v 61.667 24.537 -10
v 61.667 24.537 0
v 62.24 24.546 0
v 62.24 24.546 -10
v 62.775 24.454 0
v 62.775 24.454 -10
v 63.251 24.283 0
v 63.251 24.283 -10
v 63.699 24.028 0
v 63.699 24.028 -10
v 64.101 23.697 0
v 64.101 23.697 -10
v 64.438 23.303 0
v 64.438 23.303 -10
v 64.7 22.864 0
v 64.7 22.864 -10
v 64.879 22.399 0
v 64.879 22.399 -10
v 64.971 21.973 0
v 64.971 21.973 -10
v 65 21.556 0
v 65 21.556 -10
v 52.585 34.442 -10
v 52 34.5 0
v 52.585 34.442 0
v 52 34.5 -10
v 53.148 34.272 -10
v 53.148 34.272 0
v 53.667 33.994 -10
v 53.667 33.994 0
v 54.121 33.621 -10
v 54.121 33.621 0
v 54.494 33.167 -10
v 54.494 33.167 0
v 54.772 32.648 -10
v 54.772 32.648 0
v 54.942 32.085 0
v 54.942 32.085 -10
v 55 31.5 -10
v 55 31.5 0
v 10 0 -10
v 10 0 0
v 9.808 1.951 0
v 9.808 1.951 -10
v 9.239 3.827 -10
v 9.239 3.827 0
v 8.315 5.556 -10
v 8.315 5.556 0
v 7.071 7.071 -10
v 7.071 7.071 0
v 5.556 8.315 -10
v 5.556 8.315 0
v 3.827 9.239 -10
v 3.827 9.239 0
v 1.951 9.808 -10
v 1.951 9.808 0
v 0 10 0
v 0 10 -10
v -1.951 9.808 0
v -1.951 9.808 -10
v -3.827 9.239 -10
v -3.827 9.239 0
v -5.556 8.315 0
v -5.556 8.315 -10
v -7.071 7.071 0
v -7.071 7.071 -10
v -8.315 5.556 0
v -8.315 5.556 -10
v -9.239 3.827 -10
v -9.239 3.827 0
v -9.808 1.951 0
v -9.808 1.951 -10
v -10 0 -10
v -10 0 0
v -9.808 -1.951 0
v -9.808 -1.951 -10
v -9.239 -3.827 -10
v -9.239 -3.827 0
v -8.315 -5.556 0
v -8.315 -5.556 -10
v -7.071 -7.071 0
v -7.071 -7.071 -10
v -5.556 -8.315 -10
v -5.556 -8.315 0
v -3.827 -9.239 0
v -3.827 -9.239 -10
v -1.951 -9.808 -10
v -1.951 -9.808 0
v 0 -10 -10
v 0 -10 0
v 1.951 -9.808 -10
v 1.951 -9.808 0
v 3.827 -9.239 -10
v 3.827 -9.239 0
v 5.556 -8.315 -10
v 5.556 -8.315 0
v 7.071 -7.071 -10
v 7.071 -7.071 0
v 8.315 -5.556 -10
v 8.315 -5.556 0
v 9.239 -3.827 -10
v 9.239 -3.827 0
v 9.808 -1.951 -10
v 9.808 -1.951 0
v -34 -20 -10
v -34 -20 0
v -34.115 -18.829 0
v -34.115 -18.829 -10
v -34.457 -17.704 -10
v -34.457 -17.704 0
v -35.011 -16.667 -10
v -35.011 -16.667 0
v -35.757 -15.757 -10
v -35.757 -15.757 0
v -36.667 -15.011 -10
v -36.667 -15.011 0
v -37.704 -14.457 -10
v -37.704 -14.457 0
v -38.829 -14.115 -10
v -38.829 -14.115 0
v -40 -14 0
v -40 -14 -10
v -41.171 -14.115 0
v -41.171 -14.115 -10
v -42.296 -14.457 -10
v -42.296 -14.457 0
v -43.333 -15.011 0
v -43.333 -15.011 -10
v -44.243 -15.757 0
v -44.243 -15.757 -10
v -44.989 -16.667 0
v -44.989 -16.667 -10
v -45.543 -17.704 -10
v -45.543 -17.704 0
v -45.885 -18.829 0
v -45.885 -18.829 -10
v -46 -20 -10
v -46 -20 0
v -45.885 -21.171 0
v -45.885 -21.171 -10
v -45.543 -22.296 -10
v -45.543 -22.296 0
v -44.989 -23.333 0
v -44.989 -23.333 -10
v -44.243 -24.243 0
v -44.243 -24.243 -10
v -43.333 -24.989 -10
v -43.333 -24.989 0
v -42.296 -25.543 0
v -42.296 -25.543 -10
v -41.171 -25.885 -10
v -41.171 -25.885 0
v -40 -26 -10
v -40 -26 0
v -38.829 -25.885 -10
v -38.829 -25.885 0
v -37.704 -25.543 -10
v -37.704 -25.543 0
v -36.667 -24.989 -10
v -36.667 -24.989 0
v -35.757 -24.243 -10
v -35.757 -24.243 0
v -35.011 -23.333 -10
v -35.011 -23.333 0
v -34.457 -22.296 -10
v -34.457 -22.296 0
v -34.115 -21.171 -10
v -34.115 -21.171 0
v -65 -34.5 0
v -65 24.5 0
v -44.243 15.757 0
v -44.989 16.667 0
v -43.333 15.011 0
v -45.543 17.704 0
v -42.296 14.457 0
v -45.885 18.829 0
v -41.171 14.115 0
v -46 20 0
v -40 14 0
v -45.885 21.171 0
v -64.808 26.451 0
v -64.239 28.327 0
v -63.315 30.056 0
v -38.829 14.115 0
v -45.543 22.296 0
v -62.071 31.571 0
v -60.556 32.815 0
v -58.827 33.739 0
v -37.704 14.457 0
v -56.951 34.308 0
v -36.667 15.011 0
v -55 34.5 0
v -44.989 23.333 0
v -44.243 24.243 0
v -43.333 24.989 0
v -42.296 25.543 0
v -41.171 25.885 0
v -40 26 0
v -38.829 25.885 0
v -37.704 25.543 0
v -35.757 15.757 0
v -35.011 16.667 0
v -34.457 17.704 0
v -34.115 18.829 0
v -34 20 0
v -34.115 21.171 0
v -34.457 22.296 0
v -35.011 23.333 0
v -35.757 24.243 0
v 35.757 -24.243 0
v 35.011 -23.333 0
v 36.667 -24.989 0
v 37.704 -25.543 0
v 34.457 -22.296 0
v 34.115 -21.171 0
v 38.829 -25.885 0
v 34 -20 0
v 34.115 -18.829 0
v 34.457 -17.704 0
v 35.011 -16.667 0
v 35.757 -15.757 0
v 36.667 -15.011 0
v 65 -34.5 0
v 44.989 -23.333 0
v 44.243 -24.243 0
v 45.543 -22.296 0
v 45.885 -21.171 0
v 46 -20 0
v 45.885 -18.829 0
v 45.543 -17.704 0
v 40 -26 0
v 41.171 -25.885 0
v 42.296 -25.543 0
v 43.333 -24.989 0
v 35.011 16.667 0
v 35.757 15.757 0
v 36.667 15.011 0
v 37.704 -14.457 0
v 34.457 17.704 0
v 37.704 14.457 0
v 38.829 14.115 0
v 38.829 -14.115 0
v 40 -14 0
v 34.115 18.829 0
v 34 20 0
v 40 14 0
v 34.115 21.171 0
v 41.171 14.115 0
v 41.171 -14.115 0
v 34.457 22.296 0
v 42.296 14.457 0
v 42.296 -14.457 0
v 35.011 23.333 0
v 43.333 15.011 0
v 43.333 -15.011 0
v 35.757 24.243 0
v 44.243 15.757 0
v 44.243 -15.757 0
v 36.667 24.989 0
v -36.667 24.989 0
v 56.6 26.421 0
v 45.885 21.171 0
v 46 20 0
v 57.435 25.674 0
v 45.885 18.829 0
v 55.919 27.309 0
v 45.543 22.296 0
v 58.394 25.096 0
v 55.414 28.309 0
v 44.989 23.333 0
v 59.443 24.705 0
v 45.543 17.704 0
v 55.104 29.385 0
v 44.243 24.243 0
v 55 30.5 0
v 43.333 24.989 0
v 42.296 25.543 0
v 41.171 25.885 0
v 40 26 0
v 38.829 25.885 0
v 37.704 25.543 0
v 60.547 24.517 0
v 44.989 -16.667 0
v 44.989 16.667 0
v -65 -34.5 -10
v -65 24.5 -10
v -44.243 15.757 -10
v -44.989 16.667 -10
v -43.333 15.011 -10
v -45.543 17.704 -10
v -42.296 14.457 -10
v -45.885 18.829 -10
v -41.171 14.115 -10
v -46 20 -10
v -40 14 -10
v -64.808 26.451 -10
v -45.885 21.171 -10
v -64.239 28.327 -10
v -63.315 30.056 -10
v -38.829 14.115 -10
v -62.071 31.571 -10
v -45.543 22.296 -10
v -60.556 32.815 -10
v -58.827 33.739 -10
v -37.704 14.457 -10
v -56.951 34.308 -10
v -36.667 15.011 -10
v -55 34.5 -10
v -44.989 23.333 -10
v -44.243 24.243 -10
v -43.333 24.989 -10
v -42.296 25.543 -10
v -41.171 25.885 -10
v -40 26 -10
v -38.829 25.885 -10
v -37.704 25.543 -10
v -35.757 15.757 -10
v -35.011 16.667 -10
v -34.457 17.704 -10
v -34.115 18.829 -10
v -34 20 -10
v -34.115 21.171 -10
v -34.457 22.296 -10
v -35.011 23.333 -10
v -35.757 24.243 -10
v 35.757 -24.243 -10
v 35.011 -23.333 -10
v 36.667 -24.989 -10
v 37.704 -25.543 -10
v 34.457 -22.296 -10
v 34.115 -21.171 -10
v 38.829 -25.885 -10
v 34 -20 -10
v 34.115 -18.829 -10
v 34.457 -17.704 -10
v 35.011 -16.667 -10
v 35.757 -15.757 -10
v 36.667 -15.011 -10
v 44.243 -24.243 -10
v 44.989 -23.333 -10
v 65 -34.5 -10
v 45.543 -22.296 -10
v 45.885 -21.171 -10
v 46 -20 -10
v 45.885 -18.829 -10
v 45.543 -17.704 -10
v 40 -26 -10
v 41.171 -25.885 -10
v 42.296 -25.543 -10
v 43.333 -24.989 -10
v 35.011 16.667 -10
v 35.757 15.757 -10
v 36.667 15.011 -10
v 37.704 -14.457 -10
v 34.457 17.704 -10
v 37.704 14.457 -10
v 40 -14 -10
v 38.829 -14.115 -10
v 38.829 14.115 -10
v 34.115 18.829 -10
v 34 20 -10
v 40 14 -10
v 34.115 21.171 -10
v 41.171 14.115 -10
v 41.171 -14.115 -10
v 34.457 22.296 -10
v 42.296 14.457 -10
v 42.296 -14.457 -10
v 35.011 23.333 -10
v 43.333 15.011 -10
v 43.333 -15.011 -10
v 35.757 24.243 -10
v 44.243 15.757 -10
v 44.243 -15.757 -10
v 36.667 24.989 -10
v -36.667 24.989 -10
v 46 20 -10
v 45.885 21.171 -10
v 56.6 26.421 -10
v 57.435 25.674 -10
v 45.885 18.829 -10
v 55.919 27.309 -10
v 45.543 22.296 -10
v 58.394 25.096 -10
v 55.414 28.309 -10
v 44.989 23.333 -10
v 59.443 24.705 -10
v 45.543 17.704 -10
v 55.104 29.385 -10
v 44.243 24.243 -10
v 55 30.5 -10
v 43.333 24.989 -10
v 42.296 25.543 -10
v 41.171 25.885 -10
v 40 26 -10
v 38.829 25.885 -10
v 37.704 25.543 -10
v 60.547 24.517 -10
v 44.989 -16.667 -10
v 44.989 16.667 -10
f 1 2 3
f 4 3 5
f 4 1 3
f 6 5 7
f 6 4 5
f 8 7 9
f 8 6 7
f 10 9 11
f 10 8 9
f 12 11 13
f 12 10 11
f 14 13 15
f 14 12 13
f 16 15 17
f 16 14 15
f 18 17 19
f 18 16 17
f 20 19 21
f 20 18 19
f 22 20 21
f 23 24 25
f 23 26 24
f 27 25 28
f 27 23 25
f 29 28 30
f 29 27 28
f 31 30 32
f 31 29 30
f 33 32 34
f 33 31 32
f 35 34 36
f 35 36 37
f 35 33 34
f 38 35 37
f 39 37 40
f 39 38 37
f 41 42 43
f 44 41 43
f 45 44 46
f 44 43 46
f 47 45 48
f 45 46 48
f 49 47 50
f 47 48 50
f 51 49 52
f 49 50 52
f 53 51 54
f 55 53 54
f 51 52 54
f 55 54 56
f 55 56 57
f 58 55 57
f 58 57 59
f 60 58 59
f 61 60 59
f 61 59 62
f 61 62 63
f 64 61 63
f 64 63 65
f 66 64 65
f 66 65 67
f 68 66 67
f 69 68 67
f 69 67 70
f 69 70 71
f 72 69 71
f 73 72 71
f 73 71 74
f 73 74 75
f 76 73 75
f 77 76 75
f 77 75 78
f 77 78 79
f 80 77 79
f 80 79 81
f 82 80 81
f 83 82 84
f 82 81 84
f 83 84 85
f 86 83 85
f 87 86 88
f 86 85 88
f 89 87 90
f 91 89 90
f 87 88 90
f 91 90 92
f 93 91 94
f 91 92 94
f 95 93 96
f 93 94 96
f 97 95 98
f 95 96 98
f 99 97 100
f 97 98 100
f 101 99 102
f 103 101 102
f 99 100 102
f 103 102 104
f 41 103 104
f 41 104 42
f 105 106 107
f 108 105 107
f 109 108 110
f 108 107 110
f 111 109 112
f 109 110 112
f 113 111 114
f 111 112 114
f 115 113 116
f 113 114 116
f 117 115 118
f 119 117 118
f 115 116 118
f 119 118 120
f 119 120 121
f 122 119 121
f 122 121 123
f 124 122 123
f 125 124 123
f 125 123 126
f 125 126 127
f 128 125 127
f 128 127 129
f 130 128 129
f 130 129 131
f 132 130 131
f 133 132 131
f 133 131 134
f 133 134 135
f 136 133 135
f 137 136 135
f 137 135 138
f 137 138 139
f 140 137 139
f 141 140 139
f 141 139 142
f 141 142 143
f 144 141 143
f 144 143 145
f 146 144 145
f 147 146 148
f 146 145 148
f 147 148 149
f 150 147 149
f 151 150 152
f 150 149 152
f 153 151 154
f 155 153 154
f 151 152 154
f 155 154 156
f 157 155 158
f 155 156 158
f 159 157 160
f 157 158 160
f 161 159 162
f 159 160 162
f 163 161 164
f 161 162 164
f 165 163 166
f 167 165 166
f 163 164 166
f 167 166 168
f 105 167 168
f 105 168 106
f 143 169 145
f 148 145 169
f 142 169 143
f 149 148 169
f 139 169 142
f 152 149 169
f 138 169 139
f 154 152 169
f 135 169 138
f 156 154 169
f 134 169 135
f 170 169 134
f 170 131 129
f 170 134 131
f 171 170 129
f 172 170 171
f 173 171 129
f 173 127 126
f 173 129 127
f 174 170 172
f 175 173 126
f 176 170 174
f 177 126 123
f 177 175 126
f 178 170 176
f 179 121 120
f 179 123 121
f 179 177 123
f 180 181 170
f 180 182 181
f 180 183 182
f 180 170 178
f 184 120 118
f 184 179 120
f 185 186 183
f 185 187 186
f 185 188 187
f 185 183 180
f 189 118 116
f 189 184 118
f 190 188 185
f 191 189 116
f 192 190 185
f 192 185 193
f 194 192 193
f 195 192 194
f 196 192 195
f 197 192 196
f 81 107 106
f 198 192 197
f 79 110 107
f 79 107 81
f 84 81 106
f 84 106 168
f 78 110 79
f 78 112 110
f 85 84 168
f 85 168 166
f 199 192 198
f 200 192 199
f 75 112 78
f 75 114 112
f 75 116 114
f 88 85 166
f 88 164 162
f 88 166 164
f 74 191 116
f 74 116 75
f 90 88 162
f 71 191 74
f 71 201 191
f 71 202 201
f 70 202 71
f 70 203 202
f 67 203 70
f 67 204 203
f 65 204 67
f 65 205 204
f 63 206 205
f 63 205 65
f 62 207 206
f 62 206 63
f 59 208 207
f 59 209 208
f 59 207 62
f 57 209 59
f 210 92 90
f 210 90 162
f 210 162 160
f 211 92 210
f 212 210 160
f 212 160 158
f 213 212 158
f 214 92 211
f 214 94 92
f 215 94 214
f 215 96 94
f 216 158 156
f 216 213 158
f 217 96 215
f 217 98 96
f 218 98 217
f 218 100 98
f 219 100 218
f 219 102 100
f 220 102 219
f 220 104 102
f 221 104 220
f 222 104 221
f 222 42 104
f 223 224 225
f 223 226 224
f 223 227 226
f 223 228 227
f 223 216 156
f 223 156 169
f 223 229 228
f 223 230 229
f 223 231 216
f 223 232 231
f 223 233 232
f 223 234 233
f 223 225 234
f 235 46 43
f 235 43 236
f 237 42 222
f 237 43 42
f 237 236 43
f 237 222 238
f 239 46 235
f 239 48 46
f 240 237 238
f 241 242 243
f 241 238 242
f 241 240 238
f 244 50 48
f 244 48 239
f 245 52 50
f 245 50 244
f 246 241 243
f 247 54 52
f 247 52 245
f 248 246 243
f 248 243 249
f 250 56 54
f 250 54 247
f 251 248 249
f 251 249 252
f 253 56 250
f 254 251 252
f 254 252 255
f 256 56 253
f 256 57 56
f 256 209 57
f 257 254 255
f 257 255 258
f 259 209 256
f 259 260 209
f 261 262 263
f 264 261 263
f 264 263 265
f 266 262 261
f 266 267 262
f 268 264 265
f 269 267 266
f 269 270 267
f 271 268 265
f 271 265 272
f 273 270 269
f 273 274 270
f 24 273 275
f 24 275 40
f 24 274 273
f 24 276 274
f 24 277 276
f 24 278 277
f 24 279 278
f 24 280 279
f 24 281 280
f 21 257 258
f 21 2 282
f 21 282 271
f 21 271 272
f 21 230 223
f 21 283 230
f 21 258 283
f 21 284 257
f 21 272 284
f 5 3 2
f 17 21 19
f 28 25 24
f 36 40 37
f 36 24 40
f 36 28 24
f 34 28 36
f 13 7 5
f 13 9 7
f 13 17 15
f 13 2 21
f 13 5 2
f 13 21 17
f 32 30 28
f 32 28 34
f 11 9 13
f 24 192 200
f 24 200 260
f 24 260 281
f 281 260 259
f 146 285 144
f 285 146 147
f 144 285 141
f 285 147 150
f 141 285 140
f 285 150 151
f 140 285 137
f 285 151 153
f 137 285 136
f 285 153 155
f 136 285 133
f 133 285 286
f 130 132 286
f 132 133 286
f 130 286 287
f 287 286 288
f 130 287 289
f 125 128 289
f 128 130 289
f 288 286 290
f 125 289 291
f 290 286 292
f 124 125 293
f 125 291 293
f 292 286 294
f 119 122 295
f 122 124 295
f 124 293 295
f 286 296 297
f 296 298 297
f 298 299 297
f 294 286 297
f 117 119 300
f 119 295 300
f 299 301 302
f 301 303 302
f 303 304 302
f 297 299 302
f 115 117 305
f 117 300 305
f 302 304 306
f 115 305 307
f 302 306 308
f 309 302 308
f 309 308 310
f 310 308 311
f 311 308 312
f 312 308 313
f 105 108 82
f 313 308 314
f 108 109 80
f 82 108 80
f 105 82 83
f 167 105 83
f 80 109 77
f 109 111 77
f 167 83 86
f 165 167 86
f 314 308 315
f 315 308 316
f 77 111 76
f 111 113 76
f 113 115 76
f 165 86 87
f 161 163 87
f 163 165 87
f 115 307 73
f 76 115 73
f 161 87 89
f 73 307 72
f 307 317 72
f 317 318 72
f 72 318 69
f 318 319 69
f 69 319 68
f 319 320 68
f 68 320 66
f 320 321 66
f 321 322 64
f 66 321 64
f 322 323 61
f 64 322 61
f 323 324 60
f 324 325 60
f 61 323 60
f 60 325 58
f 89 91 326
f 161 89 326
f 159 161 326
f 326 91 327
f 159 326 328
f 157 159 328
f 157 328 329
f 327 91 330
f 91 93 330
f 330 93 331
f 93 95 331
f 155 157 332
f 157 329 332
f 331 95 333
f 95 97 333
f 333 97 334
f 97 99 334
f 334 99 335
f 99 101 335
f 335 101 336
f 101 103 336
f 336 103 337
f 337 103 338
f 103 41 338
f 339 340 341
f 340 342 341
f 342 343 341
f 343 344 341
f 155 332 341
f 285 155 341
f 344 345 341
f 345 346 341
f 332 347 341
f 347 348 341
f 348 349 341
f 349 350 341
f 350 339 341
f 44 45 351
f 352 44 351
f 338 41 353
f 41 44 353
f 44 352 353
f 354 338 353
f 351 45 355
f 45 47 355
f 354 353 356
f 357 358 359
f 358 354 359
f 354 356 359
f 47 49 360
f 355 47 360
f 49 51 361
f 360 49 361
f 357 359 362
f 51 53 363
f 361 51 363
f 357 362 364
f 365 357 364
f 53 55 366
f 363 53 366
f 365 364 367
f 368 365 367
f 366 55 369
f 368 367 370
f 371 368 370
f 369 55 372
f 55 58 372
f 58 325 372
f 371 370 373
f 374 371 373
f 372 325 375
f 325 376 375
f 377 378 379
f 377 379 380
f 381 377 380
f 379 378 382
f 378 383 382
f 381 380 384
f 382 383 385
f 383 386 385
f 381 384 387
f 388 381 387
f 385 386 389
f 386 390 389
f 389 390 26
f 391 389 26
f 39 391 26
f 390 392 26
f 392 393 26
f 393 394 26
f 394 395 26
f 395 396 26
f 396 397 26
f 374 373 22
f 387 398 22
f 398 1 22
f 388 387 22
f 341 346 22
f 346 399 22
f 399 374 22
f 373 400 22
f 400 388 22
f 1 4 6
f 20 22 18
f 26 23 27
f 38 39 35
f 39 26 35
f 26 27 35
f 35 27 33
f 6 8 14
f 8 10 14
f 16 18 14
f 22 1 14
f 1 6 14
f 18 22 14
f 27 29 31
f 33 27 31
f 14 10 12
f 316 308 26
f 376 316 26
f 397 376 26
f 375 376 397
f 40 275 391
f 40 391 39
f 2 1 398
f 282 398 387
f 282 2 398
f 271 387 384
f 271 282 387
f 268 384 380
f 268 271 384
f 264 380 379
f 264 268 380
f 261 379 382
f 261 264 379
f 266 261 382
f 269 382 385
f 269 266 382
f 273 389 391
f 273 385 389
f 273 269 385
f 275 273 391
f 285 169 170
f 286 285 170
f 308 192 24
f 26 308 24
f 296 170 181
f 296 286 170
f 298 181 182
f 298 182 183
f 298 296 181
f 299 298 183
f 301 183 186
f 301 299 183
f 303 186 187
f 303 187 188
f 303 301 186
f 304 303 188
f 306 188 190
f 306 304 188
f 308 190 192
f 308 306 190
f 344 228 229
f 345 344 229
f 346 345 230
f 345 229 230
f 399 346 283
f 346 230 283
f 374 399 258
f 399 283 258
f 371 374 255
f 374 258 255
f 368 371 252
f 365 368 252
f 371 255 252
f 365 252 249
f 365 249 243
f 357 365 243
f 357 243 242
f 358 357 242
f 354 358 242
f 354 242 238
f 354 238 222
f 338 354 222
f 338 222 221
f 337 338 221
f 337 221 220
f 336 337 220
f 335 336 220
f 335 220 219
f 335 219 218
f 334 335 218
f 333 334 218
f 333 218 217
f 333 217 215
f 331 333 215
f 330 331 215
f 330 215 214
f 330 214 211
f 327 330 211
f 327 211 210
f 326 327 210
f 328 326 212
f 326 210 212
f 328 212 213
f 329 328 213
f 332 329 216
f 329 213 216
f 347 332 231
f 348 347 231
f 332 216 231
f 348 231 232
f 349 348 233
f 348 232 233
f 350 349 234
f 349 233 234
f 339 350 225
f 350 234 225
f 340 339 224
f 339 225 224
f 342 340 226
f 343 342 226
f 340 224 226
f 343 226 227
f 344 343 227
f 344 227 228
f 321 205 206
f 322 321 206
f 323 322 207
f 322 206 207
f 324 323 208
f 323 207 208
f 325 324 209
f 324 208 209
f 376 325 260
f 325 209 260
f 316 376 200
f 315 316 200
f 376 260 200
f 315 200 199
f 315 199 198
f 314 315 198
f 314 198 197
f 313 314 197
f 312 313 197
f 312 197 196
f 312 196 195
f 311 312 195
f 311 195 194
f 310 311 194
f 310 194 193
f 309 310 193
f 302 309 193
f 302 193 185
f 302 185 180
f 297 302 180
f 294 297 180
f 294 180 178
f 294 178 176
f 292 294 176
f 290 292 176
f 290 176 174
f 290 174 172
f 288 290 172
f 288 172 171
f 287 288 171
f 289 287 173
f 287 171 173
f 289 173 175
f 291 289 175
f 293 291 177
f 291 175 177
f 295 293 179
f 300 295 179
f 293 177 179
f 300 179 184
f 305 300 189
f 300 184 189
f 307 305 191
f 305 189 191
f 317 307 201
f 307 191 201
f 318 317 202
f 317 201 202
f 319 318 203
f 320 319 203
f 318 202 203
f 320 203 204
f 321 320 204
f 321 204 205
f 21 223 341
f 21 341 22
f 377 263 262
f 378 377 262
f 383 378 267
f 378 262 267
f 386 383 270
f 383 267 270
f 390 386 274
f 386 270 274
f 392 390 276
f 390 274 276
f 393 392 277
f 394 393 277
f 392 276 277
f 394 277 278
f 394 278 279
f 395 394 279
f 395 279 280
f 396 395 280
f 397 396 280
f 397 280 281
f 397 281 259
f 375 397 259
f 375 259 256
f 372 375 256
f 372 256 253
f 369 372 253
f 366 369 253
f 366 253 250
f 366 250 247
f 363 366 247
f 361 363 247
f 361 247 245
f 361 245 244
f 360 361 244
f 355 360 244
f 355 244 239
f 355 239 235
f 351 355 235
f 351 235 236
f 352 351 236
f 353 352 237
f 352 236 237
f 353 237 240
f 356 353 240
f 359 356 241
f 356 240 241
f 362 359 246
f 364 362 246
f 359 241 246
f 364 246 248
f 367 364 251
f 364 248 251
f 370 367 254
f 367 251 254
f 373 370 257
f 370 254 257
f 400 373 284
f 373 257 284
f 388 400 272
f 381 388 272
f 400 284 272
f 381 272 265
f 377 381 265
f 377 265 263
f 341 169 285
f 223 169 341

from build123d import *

# Parameters (mm, degrees)
SKETCH1_W          = 130
SKETCH1_H          = 69
BASE_FLANGE1_DEPTH = 10
SKETCH6_R          = 10
SKETCH6_R_2        = 6
CUT_EXTRUDE1_DEPTH = 75.264729179
FILLET1_R          = 10
CUT_EXTRUDE2_DEPTH = 75.264729179
FILLET2_R          = 3


# Sheet-metal steps are written as plain solids
with BuildPart() as part:
    # Sketch1 → Base-Flange1 (new body)
    with BuildSketch(Plane.XY):
        Rectangle(SKETCH1_W, SKETCH1_H)
    extrude(amount=-BASE_FLANGE1_DEPTH)

    # Sketch6 → Cut-Extrude1 (cut, through all)
    with BuildSketch(Plane.XY):
        Circle(SKETCH6_R)
        with Locations((-40, 20)):
            Circle(SKETCH6_R_2)
        with Locations((-40, -20)):
            Circle(SKETCH6_R_2)
        with Locations((40, -20)):
            Circle(SKETCH6_R_2)
        with Locations((40, 20)):
            Circle(SKETCH6_R_2)
    extrude(amount=-CUT_EXTRUDE1_DEPTH, mode=Mode.SUBTRACT)

    # Fillet1
    fillet1_edges = [part.edges().sort_by_distance(p)[0] for p in [
        (-65, 34.5, -5),
        (65, 34.5, -5),
    ]]
    fillet(fillet1_edges, radius=FILLET1_R)

    # Sketch7 → Cut-Extrude2 (cut, through all)
    with BuildSketch(Plane.XY):
        with BuildLine():
            Line((67, 34.5), (67, 30.5))
            ThreePointArc((67, 30.5), (61, 24.5), (55, 30.5))
            Line((55, 30.5), (55, 34.5))
            ThreePointArc((55, 34.5), (61, 40.5), (67, 34.5))
        make_face()
    extrude(amount=-CUT_EXTRUDE2_DEPTH, mode=Mode.SUBTRACT)

    # Fillet2
    fillet2_edges = [part.edges().sort_by_distance(p)[0] for p in [
        (55, 34.5, -5),
        (64.896192513, 25.93714082, -5),
    ]]
    fillet(fillet2_edges, radius=FILLET2_R)


solid = part.part
